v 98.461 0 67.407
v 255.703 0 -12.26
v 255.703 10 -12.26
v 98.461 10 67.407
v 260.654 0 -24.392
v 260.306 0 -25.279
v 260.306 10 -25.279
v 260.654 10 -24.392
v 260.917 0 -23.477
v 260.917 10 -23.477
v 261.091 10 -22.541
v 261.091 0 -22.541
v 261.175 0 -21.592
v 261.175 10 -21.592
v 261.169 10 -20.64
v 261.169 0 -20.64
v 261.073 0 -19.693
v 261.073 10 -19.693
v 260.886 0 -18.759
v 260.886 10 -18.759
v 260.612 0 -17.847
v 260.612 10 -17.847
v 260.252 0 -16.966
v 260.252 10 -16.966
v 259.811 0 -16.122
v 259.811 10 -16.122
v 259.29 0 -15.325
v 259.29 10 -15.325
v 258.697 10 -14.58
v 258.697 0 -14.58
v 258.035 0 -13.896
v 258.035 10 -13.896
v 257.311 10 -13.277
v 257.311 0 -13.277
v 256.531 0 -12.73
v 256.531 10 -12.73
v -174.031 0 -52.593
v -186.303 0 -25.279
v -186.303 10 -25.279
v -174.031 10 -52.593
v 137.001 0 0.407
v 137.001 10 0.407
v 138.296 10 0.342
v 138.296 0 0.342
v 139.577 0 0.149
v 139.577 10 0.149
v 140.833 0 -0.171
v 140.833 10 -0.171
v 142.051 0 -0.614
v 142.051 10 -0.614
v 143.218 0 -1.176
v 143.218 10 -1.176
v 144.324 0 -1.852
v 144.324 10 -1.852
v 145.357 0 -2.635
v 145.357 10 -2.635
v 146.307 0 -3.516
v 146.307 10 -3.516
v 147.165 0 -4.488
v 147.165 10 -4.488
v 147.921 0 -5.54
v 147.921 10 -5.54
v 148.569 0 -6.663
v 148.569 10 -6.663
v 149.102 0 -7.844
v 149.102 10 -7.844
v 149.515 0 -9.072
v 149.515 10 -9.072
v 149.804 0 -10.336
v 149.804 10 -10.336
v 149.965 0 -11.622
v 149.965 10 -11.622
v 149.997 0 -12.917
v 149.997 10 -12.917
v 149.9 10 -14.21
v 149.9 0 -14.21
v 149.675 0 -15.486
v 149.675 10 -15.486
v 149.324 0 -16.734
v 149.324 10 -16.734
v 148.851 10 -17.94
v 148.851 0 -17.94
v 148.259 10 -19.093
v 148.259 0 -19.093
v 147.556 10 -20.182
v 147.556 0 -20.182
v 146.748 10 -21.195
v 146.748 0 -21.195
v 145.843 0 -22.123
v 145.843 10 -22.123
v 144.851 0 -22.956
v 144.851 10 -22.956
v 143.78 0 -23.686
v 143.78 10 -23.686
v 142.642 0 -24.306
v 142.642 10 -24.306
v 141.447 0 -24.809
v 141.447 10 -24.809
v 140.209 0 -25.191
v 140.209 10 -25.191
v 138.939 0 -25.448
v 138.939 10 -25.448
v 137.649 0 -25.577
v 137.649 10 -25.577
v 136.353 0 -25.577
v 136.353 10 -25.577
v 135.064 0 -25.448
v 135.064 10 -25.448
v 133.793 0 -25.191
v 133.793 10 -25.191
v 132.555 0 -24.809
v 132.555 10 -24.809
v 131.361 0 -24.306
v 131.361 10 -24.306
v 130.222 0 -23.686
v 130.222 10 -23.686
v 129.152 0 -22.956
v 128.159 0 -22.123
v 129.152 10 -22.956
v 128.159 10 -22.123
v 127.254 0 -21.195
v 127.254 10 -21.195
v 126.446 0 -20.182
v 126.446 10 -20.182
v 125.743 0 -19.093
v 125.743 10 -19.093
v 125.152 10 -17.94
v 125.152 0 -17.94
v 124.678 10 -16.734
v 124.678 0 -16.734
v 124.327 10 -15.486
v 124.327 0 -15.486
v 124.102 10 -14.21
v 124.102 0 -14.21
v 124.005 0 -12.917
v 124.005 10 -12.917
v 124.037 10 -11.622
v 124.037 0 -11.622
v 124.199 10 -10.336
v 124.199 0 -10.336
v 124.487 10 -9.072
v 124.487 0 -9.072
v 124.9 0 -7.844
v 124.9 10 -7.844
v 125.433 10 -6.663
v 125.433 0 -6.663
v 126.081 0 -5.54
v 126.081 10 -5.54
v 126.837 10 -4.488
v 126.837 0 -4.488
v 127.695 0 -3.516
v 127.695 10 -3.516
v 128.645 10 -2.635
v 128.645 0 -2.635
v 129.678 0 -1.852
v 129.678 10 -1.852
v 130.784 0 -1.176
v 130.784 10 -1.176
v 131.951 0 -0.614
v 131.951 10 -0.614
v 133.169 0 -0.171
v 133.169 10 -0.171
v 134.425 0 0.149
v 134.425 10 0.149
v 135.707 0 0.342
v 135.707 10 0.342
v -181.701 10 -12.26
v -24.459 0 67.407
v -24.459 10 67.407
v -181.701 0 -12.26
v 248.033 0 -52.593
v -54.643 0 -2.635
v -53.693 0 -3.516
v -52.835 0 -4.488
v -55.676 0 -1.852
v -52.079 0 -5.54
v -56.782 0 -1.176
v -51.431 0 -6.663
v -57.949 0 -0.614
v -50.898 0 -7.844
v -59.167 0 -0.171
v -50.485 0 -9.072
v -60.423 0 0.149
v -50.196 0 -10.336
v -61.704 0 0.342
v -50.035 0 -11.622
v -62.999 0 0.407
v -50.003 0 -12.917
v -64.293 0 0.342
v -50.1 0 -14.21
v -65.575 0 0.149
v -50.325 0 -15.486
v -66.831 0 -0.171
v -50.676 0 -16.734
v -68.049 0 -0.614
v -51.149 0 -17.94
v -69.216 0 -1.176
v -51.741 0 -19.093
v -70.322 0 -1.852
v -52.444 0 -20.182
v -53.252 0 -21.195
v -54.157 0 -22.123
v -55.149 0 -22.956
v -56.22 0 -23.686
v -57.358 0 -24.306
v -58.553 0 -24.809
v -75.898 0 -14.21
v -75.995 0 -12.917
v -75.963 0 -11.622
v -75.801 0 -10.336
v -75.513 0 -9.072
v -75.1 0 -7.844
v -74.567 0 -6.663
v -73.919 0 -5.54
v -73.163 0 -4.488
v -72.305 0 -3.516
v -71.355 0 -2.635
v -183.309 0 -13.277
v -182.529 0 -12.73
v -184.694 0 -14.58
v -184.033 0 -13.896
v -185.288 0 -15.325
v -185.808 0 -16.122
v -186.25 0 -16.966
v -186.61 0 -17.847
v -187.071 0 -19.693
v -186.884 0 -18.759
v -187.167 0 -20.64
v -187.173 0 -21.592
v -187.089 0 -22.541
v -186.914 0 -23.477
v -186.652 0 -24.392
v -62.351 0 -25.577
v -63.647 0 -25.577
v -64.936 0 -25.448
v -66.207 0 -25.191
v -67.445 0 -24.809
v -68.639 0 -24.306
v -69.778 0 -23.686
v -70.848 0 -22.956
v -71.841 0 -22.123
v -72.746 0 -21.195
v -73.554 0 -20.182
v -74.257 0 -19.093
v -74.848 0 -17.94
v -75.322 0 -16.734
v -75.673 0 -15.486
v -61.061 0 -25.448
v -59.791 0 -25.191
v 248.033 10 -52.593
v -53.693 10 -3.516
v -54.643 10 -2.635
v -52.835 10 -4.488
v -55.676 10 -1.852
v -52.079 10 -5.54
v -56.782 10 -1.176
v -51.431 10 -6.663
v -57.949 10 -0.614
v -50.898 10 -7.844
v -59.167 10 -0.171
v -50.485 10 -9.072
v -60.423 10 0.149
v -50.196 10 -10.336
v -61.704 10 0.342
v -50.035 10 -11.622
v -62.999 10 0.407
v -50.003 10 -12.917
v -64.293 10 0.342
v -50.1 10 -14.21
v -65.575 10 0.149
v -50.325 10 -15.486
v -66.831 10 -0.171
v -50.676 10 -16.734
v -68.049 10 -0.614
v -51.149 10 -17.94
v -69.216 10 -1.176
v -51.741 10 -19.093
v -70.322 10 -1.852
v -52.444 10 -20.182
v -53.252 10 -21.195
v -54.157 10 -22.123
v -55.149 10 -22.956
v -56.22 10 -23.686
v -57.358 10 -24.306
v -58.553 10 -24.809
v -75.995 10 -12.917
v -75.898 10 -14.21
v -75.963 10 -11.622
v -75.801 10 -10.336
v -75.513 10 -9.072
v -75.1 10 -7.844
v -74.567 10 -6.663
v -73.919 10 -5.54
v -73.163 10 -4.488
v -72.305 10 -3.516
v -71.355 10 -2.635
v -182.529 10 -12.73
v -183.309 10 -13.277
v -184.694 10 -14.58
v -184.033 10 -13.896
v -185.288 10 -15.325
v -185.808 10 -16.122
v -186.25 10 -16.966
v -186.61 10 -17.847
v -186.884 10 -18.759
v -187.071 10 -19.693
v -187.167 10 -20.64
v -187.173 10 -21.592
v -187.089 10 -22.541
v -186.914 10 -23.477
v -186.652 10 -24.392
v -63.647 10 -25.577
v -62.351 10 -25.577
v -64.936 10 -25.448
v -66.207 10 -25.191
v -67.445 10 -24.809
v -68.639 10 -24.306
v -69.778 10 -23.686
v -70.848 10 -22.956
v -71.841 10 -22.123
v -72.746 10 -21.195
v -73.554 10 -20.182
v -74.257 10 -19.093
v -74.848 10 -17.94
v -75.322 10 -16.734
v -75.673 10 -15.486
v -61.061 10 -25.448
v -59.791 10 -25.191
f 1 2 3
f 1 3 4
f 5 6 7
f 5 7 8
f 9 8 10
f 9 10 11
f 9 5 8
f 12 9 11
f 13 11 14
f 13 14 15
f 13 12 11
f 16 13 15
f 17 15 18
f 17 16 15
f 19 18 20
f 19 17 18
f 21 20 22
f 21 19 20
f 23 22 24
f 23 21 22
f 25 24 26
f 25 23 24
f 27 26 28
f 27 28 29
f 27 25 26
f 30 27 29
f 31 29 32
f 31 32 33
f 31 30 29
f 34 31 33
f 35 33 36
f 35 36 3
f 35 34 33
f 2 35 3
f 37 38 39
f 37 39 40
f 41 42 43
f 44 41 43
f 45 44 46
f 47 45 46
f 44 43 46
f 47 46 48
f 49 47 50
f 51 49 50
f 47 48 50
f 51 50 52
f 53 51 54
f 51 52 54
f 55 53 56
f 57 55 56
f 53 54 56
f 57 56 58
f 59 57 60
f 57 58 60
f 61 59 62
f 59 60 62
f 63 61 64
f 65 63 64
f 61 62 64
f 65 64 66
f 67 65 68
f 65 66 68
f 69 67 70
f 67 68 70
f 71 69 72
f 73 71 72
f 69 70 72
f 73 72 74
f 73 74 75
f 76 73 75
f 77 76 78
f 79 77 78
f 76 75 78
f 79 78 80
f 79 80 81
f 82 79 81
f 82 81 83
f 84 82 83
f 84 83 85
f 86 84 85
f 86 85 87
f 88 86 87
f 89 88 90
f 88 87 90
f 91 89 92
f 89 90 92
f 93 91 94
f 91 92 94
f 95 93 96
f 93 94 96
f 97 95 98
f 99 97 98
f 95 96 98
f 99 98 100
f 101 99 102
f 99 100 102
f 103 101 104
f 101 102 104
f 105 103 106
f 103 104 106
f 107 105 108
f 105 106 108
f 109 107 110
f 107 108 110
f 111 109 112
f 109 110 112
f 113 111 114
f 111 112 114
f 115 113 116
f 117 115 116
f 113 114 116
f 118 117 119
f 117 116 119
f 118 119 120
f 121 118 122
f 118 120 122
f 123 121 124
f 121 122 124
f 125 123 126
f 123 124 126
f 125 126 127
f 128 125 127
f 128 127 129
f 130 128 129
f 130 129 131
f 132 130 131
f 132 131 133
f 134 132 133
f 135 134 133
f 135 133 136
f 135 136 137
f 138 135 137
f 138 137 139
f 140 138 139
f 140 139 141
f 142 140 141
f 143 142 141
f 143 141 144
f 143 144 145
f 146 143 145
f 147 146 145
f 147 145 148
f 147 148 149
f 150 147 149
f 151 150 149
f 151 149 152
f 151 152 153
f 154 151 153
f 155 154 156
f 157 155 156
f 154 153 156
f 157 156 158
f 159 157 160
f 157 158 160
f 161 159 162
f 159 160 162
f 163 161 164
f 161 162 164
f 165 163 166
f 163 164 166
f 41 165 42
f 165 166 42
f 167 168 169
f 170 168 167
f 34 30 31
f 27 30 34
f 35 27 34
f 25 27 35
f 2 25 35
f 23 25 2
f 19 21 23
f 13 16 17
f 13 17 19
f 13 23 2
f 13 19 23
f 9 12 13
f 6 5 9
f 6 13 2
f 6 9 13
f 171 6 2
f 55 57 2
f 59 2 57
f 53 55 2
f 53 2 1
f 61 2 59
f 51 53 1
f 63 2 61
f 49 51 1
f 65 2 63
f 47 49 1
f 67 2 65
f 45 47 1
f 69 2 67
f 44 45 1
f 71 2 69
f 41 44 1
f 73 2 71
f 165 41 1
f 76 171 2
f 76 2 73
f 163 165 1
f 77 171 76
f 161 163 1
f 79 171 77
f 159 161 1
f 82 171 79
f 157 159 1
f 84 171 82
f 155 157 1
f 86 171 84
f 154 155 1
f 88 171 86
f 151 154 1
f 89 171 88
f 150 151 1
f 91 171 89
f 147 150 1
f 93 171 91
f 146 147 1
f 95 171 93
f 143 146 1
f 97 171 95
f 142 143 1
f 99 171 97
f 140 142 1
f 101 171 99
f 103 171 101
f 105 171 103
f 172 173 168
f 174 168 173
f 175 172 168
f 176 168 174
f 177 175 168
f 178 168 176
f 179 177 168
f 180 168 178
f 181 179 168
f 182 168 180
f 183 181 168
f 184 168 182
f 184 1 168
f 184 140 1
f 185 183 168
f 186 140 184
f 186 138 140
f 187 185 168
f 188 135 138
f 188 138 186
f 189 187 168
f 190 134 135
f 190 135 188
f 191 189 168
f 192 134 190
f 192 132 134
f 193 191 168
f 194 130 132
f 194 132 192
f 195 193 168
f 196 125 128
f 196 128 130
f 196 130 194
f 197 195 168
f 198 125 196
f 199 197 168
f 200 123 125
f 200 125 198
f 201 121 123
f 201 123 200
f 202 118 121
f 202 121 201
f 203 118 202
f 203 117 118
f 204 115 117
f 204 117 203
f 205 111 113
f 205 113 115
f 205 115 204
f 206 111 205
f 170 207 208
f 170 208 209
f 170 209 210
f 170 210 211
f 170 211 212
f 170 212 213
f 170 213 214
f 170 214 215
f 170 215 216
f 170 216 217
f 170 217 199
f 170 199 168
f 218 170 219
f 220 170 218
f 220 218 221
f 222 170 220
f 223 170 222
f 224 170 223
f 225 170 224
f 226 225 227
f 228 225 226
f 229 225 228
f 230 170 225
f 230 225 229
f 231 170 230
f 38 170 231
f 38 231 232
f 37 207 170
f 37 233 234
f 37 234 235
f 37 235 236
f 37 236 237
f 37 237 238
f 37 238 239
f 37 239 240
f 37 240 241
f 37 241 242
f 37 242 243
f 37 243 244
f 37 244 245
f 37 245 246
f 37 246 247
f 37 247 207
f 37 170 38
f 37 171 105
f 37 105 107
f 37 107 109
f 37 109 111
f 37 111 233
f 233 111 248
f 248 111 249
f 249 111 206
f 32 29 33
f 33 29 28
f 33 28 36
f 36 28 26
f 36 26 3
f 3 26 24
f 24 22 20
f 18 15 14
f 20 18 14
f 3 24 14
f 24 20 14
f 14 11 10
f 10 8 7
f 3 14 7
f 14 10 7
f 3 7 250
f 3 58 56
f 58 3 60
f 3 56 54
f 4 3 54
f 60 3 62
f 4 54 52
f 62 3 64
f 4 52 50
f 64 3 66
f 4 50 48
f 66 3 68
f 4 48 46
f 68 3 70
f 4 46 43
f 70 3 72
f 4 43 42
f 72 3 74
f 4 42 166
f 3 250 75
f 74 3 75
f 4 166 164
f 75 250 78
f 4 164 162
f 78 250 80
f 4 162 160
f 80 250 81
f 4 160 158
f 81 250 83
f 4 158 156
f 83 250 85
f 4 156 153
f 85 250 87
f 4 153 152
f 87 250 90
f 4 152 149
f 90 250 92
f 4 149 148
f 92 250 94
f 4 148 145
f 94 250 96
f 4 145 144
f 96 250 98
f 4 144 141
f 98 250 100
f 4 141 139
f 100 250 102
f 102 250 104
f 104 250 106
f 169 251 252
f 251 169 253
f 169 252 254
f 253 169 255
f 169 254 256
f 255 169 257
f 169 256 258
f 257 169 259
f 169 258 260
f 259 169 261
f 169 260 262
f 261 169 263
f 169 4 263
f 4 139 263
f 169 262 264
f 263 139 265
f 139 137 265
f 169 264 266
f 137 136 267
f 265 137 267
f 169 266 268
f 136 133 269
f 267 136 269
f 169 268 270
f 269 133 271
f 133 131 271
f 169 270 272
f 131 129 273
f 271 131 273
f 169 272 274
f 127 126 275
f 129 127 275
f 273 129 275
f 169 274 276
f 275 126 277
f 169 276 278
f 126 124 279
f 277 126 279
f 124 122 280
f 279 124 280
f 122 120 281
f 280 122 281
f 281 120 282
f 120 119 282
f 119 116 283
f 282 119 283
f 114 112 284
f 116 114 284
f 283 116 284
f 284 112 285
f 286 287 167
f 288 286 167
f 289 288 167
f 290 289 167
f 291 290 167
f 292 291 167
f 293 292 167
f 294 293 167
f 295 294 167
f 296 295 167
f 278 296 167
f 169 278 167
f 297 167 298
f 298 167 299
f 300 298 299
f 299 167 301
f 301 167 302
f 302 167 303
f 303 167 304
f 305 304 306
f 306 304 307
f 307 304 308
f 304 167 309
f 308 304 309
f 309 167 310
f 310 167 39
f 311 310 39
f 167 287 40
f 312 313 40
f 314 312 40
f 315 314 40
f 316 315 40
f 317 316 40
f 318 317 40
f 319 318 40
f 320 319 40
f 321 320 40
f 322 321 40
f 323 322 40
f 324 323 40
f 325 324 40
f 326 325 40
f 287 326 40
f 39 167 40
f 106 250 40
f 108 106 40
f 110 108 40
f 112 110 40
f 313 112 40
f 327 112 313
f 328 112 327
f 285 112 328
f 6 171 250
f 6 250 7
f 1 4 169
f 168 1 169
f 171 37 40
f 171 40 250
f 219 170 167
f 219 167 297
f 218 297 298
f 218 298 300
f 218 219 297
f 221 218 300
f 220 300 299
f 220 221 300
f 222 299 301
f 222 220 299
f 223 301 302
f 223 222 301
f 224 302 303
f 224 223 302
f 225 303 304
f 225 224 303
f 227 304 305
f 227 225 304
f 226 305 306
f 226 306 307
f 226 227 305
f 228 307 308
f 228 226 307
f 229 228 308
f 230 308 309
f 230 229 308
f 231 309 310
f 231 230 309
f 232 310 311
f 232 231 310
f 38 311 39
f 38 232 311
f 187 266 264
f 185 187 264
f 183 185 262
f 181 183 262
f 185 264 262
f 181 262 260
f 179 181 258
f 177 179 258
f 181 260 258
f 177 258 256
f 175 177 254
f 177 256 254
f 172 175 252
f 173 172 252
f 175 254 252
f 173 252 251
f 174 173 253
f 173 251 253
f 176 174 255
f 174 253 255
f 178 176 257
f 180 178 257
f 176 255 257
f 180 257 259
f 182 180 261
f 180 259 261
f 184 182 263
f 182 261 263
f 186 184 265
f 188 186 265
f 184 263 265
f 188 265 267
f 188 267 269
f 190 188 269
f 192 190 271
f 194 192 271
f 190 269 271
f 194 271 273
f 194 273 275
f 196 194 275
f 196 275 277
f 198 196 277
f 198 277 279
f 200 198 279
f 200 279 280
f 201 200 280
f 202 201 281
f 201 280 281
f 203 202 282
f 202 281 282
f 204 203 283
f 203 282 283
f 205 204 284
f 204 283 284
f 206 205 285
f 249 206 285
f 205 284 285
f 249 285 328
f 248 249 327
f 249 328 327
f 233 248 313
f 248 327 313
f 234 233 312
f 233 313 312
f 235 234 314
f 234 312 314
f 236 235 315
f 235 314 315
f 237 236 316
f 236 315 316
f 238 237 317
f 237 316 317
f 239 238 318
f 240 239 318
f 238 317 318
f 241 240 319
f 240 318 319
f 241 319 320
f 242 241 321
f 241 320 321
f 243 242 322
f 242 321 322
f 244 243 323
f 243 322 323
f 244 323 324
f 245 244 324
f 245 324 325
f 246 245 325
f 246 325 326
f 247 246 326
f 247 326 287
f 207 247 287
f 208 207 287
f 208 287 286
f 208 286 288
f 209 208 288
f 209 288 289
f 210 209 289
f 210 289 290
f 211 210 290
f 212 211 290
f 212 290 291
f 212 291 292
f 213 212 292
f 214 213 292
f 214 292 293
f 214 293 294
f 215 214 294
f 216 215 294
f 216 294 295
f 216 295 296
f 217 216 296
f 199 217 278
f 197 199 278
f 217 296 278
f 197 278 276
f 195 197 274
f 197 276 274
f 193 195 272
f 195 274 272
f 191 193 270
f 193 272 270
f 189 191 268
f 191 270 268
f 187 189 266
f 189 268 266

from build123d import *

# Parameters (mm, degrees)
BOSS_EXTRUDE1_DEPTH = 10
SKETCH2_R           = 13
CUT_EXTRUDE1_DEPTH  = 10
CUT_EXTRUDE2_DEPTH  = 10


with BuildPart() as part:
    # Sketch1 → Boss-Extrude1 (new body)
    with BuildSketch(Plane(origin=(0, 0, 0), x_dir=(1, 0, 0), z_dir=(0, 1, 0))):
        with BuildLine():
            Line((248.032931618, 52.593341059), (260.305567907, 25.2785247))
            ThreePointArc((260.305567907, 25.2785247), (260.612237386, 17.847313664), (255.703480887, 12.259733394))
            Line((255.703480887, 12.259733394), (41.520626689, -96.255259938))
            ThreePointArc((41.520626689, -96.255259938), (37.001121909, -97.334829649), (32.481617129, -96.255259938))
            Line((32.481617129, -96.255259938), (-181.70123707, 12.259733394))
            ThreePointArc((-181.70123707, 12.259733394), (-186.609993569, 17.847313664), (-186.30332409, 25.2785247))
            Line((-186.30332409, 25.2785247), (-174.0306878, 52.593341059))
            Line((-174.0306878, 52.593341059), (248.032931618, 52.593341059))
        make_face()
    extrude(amount=BOSS_EXTRUDE1_DEPTH)

    # Sketch2 → Cut-Extrude1 (cut)
    with BuildSketch(Plane(origin=(0, 10, 0), x_dir=(1, 0, 0), z_dir=(0, 1, 0))):
        with Locations(Location((137.001121909, 12.593341059, 0), (0, 0, 270))):
            Circle(SKETCH2_R)
        with Locations(Location((-62.998878091, 12.593341059, 0), (0, 0, 270))):
            Circle(SKETCH2_R)
    extrude(amount=-CUT_EXTRUDE1_DEPTH, mode=Mode.SUBTRACT)

    # Sketch3 → Cut-Extrude2 (cut)
    with BuildSketch(Plane(origin=(0, 10, 0), x_dir=(1, 0, 0), z_dir=(0, 1, 0))):
        Polygon((37.001121909, -67.406658941), (125.459060888, -67.406658941), (125.459060888, -160.473444946), (-80.94279673, -160.473444946), (-80.94279673, -67.406658941), align=None)
    extrude(amount=-CUT_EXTRUDE2_DEPTH, mode=Mode.SUBTRACT)


solid = part.part
